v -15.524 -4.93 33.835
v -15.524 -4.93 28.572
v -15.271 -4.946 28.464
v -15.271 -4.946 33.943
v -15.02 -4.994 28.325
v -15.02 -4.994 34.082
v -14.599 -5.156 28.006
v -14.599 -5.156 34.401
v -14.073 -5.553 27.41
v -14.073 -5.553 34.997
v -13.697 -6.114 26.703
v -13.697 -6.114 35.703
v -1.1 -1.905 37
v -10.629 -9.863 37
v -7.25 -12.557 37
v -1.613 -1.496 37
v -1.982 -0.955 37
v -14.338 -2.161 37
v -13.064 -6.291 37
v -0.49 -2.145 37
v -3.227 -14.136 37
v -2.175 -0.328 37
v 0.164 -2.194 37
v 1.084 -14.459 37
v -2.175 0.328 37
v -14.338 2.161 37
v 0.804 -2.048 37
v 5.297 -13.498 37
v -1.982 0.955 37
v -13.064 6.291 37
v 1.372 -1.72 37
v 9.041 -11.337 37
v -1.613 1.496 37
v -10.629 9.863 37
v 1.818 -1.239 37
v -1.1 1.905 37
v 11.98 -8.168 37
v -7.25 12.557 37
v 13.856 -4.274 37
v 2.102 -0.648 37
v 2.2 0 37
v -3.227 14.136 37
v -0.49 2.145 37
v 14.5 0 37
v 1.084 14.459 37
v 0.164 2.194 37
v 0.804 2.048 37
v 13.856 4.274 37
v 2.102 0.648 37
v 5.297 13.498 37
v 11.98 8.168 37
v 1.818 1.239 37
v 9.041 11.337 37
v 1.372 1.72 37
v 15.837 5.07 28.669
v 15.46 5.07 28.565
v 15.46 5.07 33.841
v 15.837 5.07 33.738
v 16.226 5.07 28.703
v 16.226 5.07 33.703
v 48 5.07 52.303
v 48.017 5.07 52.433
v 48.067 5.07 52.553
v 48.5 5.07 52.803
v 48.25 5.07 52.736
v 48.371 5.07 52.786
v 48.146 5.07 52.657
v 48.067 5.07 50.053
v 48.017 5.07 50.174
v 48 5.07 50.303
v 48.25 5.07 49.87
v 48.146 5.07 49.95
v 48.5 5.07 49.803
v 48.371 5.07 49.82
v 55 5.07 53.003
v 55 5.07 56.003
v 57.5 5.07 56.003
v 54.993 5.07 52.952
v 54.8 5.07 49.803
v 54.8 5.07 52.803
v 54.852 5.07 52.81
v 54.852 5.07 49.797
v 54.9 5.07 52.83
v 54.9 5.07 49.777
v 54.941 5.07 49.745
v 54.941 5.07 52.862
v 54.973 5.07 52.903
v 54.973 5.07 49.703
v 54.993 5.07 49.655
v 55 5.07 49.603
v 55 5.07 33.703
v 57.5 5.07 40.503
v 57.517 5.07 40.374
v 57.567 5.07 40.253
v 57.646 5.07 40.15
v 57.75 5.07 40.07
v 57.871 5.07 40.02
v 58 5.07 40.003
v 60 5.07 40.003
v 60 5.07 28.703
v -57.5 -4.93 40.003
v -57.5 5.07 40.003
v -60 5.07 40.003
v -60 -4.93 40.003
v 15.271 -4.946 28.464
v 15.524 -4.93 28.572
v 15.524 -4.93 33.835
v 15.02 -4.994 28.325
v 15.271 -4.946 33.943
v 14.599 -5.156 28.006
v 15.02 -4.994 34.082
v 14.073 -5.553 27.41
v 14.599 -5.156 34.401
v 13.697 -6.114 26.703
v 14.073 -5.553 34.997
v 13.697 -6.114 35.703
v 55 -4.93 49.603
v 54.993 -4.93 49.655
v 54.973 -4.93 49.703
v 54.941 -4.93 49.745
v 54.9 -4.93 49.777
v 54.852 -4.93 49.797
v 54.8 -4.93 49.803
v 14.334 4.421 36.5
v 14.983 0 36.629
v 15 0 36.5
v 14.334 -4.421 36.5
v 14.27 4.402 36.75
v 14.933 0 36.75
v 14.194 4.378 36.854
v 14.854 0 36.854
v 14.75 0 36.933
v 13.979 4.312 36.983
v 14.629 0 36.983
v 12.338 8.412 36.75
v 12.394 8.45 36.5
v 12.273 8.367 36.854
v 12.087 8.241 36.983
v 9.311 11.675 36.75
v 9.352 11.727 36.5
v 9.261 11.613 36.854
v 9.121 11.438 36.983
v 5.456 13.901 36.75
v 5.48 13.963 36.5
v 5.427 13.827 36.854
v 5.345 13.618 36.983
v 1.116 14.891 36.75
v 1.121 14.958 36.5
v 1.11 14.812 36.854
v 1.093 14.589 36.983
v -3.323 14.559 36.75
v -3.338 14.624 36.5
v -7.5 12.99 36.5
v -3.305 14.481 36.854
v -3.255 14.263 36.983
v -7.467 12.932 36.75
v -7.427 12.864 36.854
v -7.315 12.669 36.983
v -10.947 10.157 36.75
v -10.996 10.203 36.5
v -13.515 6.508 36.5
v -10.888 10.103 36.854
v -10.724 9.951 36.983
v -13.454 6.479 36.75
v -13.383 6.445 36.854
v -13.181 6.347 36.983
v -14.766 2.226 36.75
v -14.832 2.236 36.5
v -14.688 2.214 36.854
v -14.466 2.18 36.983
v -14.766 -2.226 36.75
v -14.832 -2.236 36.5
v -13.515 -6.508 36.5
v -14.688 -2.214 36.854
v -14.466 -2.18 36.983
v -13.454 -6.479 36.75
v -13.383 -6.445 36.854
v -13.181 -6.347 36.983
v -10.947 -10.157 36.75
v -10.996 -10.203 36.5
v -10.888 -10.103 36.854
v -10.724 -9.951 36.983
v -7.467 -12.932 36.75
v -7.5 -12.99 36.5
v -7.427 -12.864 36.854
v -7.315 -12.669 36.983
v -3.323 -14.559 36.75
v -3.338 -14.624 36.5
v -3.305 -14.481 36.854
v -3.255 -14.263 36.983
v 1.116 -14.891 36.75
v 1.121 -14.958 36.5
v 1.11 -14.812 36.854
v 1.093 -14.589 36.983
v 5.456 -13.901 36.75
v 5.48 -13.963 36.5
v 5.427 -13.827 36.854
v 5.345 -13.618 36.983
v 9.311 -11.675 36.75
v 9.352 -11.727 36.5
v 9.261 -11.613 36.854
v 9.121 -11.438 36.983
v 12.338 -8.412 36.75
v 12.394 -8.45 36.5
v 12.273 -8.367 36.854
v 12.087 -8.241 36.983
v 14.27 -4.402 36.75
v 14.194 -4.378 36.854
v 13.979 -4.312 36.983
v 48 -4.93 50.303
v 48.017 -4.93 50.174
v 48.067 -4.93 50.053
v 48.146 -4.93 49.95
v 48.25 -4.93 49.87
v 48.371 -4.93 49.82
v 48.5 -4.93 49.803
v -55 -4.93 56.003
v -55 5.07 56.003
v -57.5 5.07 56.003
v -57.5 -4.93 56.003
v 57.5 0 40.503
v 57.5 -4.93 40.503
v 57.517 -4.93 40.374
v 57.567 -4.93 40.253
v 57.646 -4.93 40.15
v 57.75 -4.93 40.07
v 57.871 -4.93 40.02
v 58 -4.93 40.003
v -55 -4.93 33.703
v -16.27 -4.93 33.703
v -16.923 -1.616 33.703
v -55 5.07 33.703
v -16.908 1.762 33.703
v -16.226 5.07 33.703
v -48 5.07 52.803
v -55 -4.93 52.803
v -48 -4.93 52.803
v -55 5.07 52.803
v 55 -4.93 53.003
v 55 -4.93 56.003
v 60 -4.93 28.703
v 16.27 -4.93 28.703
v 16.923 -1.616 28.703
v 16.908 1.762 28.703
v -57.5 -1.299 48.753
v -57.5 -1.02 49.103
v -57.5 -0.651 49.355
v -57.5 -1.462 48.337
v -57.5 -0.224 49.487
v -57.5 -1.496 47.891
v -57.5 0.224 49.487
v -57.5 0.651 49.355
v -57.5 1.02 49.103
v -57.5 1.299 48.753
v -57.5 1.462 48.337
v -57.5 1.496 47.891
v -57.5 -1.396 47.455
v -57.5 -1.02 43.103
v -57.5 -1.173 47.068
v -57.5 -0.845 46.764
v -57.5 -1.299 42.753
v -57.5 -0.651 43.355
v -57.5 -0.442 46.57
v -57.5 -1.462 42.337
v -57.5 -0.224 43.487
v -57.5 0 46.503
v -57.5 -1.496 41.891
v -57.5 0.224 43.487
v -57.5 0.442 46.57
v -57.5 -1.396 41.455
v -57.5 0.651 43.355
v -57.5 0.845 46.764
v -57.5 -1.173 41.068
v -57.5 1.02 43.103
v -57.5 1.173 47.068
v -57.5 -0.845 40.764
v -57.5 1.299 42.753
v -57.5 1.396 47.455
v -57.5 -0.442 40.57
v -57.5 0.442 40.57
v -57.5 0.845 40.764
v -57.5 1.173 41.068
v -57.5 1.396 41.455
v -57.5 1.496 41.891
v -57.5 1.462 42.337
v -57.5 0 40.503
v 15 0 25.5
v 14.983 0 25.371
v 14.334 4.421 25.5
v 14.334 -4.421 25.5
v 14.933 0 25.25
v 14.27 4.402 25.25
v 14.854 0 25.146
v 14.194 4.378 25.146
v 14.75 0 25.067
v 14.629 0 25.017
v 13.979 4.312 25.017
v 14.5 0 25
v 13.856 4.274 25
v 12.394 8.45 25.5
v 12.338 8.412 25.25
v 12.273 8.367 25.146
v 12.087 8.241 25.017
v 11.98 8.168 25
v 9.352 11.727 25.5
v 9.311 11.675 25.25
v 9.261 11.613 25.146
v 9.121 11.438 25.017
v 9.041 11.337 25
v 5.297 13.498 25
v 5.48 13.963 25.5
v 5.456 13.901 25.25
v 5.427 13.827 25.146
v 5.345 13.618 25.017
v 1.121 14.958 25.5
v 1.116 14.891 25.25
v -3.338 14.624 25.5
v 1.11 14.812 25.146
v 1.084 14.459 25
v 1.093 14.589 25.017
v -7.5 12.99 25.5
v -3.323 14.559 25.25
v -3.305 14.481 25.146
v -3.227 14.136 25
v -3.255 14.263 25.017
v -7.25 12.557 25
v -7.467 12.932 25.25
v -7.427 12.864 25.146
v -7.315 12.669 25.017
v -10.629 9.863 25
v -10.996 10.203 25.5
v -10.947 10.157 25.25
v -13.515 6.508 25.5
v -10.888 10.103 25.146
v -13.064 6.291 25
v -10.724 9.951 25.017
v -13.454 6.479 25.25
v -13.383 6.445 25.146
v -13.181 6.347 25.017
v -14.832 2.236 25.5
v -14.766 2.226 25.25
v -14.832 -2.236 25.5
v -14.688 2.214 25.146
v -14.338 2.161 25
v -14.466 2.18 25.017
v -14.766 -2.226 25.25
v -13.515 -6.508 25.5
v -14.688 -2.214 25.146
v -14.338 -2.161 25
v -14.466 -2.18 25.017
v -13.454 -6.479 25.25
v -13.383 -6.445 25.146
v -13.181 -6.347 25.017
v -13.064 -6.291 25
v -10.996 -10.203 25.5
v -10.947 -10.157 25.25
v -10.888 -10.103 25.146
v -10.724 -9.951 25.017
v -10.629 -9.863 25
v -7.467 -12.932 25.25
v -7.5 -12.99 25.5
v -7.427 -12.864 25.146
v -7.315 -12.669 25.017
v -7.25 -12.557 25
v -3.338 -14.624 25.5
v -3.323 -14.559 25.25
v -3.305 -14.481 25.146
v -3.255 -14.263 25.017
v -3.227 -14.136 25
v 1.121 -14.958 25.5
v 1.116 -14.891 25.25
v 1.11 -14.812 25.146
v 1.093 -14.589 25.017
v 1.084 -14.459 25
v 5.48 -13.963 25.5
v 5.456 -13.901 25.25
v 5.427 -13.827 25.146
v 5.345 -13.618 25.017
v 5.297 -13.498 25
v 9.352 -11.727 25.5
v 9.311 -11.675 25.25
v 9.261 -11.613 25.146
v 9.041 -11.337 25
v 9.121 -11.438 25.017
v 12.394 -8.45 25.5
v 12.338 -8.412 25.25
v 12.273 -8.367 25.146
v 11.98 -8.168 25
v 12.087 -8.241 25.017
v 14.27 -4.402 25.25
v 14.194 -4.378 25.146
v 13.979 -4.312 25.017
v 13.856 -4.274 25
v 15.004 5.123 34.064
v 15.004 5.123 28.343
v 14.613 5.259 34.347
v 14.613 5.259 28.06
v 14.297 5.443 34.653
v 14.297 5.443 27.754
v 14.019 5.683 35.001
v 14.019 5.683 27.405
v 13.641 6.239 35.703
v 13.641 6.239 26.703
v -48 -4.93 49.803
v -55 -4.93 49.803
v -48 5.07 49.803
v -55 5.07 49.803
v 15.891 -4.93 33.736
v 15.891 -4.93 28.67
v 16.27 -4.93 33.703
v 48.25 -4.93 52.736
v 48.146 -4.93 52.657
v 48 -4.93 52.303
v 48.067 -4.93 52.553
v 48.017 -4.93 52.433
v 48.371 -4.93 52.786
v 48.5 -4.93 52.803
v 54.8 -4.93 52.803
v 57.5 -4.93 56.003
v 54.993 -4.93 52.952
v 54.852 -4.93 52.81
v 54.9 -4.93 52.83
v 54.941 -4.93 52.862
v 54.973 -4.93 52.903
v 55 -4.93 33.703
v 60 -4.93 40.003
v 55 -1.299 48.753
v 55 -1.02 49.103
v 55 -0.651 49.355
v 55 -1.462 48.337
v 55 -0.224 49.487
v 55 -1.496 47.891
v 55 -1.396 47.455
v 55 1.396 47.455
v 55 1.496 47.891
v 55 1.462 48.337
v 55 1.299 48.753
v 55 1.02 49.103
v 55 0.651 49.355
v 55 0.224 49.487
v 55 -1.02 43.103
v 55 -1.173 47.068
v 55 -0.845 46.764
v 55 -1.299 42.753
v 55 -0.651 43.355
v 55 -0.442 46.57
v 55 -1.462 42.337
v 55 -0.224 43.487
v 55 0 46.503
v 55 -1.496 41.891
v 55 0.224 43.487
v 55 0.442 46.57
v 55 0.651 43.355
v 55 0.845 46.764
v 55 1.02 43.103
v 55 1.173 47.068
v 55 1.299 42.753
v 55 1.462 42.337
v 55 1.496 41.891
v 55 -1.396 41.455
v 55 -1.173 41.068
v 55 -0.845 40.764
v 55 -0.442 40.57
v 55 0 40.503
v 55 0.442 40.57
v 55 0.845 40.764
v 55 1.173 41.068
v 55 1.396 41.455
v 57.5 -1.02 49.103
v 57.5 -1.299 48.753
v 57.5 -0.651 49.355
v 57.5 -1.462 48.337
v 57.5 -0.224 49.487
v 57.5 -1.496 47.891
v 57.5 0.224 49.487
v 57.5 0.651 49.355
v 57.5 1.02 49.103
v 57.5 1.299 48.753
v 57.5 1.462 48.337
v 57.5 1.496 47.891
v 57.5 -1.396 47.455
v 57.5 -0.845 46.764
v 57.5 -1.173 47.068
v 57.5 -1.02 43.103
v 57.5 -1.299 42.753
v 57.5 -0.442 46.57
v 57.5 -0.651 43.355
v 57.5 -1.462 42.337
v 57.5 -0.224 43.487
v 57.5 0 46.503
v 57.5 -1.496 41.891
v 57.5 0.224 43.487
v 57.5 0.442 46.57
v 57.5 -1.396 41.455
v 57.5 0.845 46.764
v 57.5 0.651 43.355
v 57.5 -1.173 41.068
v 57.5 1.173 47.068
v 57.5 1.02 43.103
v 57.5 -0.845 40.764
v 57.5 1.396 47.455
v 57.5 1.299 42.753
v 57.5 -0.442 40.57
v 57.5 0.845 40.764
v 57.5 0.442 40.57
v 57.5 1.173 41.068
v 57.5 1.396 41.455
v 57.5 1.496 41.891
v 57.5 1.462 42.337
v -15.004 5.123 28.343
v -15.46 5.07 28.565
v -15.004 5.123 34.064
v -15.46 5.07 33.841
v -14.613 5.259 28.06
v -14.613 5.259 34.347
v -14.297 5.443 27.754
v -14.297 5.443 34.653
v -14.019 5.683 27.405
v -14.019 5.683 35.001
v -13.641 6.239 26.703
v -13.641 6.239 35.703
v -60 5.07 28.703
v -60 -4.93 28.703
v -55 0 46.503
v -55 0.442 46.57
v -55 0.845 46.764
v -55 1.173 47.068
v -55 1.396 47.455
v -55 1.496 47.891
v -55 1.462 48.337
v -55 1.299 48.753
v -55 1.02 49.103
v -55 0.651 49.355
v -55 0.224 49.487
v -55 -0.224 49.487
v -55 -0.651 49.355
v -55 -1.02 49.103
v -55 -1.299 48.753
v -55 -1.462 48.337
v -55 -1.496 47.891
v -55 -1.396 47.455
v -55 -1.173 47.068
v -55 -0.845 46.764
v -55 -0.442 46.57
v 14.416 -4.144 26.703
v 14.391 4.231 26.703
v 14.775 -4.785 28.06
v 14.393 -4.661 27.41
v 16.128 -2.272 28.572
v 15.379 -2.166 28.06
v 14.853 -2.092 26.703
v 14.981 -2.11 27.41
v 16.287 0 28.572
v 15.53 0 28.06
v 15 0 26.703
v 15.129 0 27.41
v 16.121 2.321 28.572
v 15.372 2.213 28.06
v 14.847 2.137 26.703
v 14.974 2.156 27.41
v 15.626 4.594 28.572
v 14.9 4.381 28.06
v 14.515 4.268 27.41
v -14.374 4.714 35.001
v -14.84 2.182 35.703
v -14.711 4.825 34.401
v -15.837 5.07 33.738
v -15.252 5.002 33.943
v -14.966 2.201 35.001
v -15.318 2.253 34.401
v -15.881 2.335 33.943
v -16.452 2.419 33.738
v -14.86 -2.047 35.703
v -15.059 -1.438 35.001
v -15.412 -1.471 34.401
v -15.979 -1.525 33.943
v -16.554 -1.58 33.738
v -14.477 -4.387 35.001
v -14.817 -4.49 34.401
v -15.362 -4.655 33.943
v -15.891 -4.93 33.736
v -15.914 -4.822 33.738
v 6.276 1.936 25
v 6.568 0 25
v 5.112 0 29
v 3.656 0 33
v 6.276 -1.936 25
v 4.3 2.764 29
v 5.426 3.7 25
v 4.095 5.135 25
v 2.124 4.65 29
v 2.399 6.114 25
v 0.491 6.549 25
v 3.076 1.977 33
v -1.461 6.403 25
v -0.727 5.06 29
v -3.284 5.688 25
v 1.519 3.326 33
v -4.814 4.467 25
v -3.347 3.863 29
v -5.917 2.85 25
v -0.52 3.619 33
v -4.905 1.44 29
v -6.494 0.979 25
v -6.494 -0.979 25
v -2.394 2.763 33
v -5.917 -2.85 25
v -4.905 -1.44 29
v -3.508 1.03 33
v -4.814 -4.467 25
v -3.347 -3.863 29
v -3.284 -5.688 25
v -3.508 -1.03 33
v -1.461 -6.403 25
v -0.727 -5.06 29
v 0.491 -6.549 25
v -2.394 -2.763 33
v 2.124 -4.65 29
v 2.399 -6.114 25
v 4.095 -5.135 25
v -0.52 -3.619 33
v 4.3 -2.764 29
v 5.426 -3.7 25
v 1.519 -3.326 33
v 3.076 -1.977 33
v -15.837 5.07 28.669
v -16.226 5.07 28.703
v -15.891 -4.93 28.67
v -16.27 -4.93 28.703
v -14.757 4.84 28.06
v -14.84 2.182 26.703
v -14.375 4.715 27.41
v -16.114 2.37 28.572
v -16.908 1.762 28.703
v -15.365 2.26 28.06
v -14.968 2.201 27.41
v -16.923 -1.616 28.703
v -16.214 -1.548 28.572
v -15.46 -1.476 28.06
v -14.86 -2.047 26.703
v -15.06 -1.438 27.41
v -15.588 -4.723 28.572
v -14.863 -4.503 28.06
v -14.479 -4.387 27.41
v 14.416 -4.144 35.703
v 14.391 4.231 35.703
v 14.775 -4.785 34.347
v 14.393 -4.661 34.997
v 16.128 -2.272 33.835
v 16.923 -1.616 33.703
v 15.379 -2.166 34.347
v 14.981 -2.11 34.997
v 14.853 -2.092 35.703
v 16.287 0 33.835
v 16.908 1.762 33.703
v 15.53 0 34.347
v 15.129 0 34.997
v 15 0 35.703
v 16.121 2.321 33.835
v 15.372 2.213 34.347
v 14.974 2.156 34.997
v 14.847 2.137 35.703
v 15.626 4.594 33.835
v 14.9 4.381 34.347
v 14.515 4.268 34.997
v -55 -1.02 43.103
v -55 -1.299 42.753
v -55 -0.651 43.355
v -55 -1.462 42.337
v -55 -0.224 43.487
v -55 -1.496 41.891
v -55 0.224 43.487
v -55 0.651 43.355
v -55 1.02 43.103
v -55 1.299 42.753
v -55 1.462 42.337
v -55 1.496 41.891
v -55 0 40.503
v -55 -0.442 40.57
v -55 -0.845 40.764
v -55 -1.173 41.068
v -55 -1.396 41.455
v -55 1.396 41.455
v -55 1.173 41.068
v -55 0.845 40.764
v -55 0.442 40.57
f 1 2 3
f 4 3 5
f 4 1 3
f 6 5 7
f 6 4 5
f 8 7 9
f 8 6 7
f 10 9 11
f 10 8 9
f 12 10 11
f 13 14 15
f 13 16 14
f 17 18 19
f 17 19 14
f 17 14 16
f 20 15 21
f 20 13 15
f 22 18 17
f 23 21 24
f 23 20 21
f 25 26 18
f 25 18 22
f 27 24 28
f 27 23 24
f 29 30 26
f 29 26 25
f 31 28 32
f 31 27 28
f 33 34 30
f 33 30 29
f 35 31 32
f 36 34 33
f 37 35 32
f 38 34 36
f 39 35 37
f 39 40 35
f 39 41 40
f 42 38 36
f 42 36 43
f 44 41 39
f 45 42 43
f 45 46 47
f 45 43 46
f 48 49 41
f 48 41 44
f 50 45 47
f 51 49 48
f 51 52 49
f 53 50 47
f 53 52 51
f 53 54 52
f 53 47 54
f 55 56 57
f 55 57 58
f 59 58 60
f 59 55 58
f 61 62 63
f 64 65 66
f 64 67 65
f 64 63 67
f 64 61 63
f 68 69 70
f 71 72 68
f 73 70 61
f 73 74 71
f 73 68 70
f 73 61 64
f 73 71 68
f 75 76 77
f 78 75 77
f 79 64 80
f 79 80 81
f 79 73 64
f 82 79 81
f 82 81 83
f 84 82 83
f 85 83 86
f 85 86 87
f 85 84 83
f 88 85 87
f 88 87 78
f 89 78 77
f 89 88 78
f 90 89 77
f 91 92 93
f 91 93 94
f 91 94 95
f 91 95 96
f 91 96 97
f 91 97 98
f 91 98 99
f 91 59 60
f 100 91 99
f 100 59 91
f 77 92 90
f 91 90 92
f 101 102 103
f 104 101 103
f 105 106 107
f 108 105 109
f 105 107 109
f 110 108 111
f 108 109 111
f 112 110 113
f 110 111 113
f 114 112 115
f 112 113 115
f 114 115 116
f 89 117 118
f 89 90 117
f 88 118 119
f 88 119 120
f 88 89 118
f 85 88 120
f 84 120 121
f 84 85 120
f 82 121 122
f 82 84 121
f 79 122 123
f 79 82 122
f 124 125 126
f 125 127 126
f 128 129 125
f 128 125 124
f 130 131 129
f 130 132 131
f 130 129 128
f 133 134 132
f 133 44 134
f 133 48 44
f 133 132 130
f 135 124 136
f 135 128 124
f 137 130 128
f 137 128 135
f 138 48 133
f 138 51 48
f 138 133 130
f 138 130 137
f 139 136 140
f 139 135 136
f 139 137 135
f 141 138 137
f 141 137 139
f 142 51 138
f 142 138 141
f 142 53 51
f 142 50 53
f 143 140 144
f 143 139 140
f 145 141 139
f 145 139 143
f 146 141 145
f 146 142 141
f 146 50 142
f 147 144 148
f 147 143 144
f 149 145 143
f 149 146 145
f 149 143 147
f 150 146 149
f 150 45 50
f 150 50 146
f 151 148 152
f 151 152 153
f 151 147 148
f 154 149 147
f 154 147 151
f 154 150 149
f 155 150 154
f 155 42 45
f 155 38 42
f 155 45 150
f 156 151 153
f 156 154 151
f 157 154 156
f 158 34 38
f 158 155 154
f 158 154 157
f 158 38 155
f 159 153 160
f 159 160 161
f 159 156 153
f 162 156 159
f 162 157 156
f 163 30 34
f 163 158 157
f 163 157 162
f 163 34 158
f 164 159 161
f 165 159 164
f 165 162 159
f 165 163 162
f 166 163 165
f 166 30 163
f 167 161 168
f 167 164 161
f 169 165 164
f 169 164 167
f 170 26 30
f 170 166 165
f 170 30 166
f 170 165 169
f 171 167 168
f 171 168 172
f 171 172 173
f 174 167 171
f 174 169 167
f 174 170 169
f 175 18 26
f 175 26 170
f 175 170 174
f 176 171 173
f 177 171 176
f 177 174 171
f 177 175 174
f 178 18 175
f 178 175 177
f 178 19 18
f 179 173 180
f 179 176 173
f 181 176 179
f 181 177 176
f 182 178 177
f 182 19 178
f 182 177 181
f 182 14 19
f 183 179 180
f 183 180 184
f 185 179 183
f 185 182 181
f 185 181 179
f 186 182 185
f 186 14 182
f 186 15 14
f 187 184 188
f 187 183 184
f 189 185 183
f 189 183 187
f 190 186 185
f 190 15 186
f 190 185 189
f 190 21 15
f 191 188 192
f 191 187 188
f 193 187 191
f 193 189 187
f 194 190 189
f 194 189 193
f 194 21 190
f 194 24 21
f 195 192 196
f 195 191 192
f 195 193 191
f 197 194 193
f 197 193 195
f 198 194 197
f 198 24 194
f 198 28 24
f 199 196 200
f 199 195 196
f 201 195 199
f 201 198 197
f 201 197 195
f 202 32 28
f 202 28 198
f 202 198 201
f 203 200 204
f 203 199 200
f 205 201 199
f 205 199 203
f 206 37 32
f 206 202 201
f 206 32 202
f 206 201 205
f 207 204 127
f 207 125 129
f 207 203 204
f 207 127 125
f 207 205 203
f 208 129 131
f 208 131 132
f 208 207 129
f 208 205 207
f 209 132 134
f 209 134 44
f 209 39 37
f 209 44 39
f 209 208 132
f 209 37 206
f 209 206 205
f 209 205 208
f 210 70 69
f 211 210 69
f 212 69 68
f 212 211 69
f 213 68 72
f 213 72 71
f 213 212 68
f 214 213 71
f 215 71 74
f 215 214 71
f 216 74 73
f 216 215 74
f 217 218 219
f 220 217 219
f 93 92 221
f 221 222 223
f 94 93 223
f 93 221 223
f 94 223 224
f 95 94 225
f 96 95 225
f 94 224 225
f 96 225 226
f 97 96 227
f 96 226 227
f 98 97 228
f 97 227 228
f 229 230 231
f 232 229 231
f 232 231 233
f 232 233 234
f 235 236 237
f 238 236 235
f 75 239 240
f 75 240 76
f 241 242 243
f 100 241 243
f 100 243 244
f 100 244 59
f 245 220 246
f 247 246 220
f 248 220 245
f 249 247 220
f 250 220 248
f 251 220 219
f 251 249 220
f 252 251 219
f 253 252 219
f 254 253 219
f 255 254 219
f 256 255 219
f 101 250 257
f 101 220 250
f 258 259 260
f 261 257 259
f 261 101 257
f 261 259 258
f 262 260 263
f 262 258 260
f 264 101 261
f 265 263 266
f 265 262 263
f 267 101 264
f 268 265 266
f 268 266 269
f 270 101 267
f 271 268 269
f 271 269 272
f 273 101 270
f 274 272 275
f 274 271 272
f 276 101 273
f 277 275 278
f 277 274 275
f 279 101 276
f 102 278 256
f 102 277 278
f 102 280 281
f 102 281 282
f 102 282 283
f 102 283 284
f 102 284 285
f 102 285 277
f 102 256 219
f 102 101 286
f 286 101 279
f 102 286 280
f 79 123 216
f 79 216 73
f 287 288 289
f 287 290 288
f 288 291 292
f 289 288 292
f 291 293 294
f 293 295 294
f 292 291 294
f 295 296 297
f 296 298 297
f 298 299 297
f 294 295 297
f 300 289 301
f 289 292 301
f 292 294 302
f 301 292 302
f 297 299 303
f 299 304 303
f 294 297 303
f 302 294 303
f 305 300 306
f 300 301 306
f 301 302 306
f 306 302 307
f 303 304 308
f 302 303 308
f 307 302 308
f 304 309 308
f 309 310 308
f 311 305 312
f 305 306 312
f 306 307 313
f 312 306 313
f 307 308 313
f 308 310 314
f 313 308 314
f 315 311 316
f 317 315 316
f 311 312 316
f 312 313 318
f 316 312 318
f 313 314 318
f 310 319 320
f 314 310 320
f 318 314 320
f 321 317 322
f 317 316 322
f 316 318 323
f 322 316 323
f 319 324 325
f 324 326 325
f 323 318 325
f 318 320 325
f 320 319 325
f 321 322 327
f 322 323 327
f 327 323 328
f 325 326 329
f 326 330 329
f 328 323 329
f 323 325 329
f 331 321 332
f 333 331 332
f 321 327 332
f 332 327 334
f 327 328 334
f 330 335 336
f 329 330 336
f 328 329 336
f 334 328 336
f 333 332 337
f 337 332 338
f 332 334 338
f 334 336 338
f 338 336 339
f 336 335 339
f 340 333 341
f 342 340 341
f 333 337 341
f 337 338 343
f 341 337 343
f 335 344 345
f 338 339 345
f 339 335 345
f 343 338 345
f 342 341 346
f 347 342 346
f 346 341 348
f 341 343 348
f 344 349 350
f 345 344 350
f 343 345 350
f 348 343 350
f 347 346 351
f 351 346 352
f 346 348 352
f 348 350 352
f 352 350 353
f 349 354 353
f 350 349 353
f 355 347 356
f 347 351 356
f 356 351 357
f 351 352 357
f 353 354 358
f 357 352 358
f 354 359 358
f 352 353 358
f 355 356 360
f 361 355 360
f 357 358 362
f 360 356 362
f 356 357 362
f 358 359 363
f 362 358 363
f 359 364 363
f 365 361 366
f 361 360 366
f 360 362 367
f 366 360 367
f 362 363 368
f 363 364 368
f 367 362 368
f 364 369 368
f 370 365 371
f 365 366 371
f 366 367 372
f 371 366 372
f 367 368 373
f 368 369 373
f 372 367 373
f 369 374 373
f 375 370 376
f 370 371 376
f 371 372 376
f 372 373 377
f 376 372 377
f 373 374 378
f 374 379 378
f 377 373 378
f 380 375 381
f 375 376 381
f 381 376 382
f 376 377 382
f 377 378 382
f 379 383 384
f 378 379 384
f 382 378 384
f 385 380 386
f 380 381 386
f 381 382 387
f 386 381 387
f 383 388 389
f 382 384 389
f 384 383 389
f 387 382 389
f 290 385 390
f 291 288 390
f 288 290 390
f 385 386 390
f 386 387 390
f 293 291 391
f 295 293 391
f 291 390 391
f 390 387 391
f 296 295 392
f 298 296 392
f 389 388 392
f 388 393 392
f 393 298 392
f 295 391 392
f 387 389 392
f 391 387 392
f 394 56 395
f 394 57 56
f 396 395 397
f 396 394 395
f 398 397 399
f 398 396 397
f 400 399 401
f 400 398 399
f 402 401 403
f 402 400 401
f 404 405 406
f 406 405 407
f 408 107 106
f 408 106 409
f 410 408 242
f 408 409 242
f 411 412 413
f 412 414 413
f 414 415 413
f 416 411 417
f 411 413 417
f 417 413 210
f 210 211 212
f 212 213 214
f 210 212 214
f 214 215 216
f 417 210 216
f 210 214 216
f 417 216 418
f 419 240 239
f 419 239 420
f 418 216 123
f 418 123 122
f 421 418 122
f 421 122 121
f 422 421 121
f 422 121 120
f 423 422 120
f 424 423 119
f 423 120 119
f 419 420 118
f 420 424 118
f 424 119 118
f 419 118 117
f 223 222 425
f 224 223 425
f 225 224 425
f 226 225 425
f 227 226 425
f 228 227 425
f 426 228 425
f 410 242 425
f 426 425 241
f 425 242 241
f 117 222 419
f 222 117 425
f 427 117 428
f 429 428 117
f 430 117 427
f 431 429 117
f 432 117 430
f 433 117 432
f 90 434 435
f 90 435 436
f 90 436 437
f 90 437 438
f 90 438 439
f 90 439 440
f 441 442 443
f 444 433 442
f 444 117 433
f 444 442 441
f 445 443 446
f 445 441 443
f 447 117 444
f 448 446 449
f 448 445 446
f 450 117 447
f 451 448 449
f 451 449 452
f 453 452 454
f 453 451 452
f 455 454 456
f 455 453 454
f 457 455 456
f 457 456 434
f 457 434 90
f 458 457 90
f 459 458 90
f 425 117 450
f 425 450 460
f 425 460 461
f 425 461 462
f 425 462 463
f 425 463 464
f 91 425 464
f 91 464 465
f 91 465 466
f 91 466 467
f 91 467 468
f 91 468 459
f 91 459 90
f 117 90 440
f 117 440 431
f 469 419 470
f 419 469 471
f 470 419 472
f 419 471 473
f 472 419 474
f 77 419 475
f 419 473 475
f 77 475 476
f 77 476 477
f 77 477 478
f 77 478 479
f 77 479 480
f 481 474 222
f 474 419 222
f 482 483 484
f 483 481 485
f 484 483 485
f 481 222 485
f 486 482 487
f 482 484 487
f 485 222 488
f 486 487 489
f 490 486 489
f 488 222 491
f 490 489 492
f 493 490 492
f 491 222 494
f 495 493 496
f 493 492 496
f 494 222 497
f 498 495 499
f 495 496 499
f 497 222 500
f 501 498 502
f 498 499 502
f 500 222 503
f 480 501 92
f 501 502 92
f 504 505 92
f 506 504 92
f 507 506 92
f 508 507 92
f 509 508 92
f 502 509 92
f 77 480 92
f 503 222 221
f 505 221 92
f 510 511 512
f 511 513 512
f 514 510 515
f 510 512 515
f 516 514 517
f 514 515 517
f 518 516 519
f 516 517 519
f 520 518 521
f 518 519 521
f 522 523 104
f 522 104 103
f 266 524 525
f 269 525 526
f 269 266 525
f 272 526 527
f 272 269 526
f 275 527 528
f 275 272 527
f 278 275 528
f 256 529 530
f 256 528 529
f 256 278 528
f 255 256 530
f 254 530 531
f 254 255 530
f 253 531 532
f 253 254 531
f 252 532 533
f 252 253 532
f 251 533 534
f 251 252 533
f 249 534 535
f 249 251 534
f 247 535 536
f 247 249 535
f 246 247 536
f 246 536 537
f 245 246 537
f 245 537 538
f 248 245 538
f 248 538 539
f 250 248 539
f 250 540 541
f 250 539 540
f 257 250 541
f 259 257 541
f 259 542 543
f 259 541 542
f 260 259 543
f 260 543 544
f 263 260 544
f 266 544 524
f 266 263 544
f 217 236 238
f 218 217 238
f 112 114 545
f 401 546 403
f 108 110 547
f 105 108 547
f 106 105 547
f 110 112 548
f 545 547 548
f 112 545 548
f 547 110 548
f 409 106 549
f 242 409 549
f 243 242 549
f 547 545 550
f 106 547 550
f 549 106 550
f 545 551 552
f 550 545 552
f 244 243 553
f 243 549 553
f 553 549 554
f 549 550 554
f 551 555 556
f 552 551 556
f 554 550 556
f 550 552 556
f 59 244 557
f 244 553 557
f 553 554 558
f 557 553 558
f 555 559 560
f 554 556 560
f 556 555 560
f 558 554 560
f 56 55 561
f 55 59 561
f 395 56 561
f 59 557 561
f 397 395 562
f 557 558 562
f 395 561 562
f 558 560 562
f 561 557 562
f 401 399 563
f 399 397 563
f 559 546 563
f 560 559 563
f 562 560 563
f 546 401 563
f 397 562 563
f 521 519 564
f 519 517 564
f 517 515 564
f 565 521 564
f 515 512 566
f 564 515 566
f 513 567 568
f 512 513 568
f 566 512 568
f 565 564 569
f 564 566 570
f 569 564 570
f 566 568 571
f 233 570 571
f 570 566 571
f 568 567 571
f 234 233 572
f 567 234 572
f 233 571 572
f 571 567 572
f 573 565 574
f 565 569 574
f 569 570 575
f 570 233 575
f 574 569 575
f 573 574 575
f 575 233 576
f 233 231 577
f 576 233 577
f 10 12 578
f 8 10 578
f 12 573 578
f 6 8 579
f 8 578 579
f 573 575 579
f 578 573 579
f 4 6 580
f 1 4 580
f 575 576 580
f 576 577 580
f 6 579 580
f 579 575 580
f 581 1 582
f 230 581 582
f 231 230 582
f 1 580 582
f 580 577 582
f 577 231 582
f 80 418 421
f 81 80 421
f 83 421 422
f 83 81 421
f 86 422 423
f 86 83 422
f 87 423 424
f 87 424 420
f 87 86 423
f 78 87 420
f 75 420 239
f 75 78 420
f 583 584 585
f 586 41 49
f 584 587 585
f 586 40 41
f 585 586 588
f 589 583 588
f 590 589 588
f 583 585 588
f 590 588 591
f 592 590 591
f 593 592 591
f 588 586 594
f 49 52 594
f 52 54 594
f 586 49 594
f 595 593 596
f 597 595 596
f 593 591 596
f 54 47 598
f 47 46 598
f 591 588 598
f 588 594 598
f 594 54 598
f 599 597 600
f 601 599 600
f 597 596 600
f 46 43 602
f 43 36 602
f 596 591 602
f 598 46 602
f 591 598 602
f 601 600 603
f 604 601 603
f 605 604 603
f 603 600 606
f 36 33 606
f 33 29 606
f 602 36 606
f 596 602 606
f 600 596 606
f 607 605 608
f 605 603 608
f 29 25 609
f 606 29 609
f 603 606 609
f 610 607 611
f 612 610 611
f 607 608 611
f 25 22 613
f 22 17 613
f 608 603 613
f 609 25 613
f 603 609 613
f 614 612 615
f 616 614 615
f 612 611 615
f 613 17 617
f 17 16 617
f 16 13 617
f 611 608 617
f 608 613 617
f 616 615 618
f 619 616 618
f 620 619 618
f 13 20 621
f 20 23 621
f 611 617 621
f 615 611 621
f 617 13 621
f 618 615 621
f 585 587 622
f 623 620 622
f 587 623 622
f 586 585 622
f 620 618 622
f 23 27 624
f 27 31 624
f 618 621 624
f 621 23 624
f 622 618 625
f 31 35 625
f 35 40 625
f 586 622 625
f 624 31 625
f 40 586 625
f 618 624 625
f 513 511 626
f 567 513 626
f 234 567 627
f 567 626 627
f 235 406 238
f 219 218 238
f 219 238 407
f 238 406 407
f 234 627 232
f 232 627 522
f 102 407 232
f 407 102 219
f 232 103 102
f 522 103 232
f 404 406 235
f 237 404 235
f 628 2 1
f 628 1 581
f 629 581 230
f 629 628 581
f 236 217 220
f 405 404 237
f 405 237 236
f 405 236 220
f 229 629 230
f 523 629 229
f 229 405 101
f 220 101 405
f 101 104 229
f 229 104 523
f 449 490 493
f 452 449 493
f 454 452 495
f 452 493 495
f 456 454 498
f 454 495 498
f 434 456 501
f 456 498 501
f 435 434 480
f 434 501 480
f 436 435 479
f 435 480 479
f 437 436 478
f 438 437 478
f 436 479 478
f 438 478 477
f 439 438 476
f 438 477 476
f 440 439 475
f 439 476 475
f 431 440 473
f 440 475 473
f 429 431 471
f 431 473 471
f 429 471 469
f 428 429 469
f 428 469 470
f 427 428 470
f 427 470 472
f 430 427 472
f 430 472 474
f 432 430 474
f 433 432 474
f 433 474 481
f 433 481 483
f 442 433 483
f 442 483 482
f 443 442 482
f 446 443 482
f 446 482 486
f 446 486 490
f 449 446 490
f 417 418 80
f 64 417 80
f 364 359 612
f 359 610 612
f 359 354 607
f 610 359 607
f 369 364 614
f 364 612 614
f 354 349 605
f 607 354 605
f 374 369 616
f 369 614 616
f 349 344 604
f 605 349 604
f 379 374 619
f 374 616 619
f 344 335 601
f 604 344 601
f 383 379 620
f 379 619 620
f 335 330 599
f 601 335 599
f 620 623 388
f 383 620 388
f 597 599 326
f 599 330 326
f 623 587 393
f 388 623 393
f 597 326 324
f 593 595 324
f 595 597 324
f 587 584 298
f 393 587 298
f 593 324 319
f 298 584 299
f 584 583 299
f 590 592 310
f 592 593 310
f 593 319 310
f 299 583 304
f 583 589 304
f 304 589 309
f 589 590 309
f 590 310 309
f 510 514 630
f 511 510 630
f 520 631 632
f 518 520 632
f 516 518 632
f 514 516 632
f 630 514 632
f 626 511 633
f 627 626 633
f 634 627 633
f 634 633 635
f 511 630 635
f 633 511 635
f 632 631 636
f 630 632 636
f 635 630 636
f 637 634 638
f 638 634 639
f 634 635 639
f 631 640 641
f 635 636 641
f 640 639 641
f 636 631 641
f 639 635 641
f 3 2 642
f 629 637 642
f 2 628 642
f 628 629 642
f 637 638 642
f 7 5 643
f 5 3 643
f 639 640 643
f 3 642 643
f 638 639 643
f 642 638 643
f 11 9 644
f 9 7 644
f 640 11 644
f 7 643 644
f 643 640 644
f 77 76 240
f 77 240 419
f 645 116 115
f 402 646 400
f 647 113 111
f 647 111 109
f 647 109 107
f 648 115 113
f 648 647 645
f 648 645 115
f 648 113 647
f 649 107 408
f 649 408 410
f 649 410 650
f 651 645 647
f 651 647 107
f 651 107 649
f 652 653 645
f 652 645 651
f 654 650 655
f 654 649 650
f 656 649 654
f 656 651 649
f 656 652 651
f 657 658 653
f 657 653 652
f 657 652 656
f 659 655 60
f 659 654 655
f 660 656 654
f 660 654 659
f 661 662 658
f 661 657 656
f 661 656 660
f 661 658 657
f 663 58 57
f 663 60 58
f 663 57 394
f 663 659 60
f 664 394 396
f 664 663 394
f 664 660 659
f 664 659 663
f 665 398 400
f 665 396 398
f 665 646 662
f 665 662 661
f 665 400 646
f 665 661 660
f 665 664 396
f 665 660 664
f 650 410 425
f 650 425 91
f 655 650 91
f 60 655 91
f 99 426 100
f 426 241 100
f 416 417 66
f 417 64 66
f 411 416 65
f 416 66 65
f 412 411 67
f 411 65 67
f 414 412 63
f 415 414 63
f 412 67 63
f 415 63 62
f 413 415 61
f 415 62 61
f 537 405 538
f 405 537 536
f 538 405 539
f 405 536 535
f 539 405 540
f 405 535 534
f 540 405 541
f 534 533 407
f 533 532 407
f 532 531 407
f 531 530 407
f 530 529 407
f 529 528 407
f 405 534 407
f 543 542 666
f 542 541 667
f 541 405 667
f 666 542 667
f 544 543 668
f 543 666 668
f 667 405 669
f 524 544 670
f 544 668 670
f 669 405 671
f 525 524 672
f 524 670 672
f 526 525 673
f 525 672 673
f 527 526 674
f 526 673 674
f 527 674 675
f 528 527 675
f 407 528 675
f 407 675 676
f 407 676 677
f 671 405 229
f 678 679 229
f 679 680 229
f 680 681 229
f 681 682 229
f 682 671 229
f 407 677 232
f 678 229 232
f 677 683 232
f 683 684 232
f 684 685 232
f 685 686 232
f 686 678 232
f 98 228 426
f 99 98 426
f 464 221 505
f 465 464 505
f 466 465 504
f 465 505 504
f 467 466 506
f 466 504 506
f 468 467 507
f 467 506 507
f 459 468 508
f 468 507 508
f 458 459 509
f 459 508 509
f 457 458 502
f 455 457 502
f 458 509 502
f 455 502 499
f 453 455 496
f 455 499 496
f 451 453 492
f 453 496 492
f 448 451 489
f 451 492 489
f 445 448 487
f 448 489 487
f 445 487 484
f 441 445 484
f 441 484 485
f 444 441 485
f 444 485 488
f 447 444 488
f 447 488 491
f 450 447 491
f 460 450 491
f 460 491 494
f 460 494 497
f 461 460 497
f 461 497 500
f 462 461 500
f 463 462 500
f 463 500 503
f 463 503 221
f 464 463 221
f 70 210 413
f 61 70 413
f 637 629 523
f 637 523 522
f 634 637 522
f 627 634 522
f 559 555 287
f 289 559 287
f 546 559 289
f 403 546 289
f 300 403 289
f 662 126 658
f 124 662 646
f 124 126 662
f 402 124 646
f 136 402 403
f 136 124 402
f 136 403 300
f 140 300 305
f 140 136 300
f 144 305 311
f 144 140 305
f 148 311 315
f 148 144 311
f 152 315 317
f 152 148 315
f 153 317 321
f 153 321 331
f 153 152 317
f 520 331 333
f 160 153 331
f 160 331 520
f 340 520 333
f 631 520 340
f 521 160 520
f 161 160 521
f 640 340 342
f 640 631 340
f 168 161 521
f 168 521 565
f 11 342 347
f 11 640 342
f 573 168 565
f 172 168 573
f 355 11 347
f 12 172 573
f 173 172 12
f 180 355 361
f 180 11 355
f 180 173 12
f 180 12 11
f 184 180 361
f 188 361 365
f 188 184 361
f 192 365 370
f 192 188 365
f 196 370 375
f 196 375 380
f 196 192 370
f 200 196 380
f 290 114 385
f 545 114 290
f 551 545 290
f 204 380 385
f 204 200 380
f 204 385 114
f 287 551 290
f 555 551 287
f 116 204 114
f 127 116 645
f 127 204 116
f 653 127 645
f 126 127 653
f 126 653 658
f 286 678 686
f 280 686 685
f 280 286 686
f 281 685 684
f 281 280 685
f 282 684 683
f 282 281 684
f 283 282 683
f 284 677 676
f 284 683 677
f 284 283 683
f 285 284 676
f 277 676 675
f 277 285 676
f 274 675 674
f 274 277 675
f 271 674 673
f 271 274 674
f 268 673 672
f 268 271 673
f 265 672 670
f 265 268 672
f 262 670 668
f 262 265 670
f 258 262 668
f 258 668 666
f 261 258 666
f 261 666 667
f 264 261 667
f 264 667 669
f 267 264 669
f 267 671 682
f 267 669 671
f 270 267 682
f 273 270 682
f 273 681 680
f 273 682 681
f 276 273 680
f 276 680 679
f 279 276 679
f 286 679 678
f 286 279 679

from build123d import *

# Parameters (mm, degrees)
SKETCH7_R            = 15
BOSS_EXTRUDE2_DEPTH  = 12
SKETCH8_R            = 2.2
CUT_EXTRUDE2_DEPTH   = 20
CUT_EXTRUDE2_DRAFT   = 20
BOSS_EXTRUDE4_START  = -3
SKETCH11_W           = 5
SKETCH11_H           = 10
BOSS_EXTRUDE4_DEPTH  = 48
SKETCH14_W           = 5
SKETCH14_H           = 10
BOSS_EXTRUDE5_DEPTH  = 6.3
SKETCH17_W           = 2.5
SKETCH17_H           = 10
BOSS_EXTRUDE8_DEPTH  = 16
SKETCH20_R           = 1.5
CUT_EXTRUDE3_DEPTH   = 15
FILLET2_R            = 2
FILLET7_R            = 0.5
FILLET8_R            = 0.5
SKETCH24_W           = 3
SKETCH24_H           = 10
BOSS_EXTRUDE11_DEPTH = 7
FILLET2_OF_MIRROR5_R = 2
FILLET9_R            = 0.2
FILLET10_START       = -6
FILLET10_DEPTH       = 12
FILLET10_START_2     = -4.929582237
FILLET10_2_DEPTH     = 10
FILLET11_R           = 0.5


with BuildPart() as part:
    # Sketch7 → Boss-Extrude2 (new body)
    with BuildSketch(Plane.XY.offset(37)):
        Circle(SKETCH7_R)
    extrude(amount=-BOSS_EXTRUDE2_DEPTH)


with BuildPart() as cut_extrude2_tool:
    # Sketch8 → Cut-Extrude2 (with draft: the straight prism first)
    with BuildSketch(Plane.XY.offset(37)):
        Circle(SKETCH8_R)
    extrude(amount=-CUT_EXTRUDE2_DEPTH)
    # Cut-Extrude2: the draft: its side faces are tilted about the plane it starts from
    cut_extrude2_sides = [cut_extrude2_tool.faces().sort_by_distance(p)[0] for p in [
        (-2.2, 0, 27),
    ]]
    draft(cut_extrude2_sides, Plane.XY.offset(37), CUT_EXTRUDE2_DRAFT)


with BuildPart() as part_1:
    add(part.part)

    # Cut-Extrude2: cut by cut_extrude2_tool
    add(cut_extrude2_tool.part, mode=Mode.SUBTRACT)

    # Sketch11 → Boss-Extrude4 (add)
    with BuildSketch(Plane(origin=(15, 0, 0), x_dir=(0, 0, -1), z_dir=(1, 0, 0)).offset(BOSS_EXTRUDE4_START)):
        with Locations((-31.203319291, 0.070417763)):
            Rectangle(SKETCH11_W, SKETCH11_H)
    boss_extrude4 = extrude(amount=BOSS_EXTRUDE4_DEPTH)

    # Sketch14 → Boss-Extrude5 (add)
    with BuildSketch(Plane.XY.offset(33.703319291)):
        with Locations((57.5, 0.070417763)):
            Rectangle(SKETCH14_W, SKETCH14_H)
    boss_extrude5 = extrude(amount=BOSS_EXTRUDE5_DEPTH)

    # Sketch17 → Boss-Extrude8 (add)
    with BuildSketch(Plane.XY.offset(40.003319291)):
        with Locations((56.25, 0.070417763)):
            Rectangle(SKETCH17_W, SKETCH17_H)
    boss_extrude8 = extrude(amount=BOSS_EXTRUDE8_DEPTH)

    # Sketch20 → Cut-Extrude3 (cut)
    with BuildSketch(Plane(origin=(57.5, 0, 0), x_dir=(0, 0, -1), z_dir=(1, 0, 0))):
        with Locations((-42.003319291, 0)):
            Circle(SKETCH20_R)
        with Locations((-48.003319291, 0)):
            Circle(SKETCH20_R)
    cut_extrude3 = extrude(amount=-CUT_EXTRUDE3_DEPTH, mode=Mode.SUBTRACT)

    # Fillet2
    fillet2_edges = [part_1.edges().sort_by_distance(p)[0] for p in [
        (14.166835178, -4.929582237, 31.203319291),
        (14.777611852, 2.573361217, 28.703319291),
        (14.117041606, 5.070417763, 31.203319291),
        (14.777611852, 2.573361217, 33.703319291),
    ]]
    fillet(fillet2_edges, radius=FILLET2_R)

    # Fillet7
    fillet7_edges = [part_1.edges().sort_by_distance(p)[0] for p in [
        (-15, 0, 37),
    ]]
    fillet(fillet7_edges, radius=FILLET7_R)

    # Fillet8
    fillet8_edges = [part_1.edges().sort_by_distance(p)[0] for p in [
        (-15, 0, 25),
    ]]
    fillet(fillet8_edges, radius=FILLET8_R)

    # Sketch24 → Boss-Extrude11 (add)
    with BuildSketch(Plane.ZY.offset(-55)):
        with Locations((51.303319291, 0.070417763)):
            Rectangle(SKETCH24_W, SKETCH24_H)
    boss_extrude11 = extrude(amount=BOSS_EXTRUDE11_DEPTH)

    # Mirror5: Boss-Extrude4, Boss-Extrude5, Boss-Extrude8, Cut-Extrude3, Boss-Extrude11 across plane
    add(boss_extrude4.mirror(Plane(origin=(0, 0, 0), x_dir=(0, 0, 1), z_dir=(1, 0, 0))))
    add(boss_extrude5.mirror(Plane(origin=(0, 0, 0), x_dir=(0, 0, 1), z_dir=(1, 0, 0))))
    add(boss_extrude8.mirror(Plane(origin=(0, 0, 0), x_dir=(0, 0, 1), z_dir=(1, 0, 0))))
    add(cut_extrude3.mirror(Plane(origin=(0, 0, 0), x_dir=(0, 0, 1), z_dir=(1, 0, 0))), mode=Mode.SUBTRACT)
    add(boss_extrude11.mirror(Plane(origin=(0, 0, 0), x_dir=(0, 0, 1), z_dir=(1, 0, 0))))

    # Fillet2 of Mirror5
    fillet2_of_mirror5_edges = [part_1.edges().sort_by_distance(p)[0] for p in [
        (-14.166835178, -4.929582237, 31.203319291),
        (-14.777611852, 2.573361217, 28.703319291),
        (-14.117041606, 5.070417763, 31.203319291),
        (-14.777611852, 2.573361217, 33.703319291),
    ]]
    fillet(fillet2_of_mirror5_edges, radius=FILLET2_OF_MIRROR5_R)

    # Fillet9
    fillet9_edges = [part_1.edges().sort_by_distance(p)[0] for p in [
        (55, 0.070417763, 52.803319291),
        (55, 0.070417763, 49.803319291),
    ]]
    fillet(fillet9_edges, radius=FILLET9_R)

    # Fillet10: read off the stored shape, not the designer's step
    # Fillet10 outline → Fillet10 (cut)
    with BuildSketch(Plane(origin=(0, 0, 0), x_dir=(1, 0, 0), z_dir=(0, 1, 0)).offset(FILLET10_START)):
        with BuildLine():
            Line((48, -49.803319291), (48, -50.303319291))
            ThreePointArc((48, -50.303319291), (48.14644661, -49.949765901), (48.5, -49.803319291))
            Line((48.5, -49.803319291), (48, -49.803319291))
        make_face()
    extrude(amount=FILLET10_DEPTH, mode=Mode.SUBTRACT)

    # Fillet10 2 outline → Fillet10 2 (add)
    with BuildSketch(Plane(origin=(0, 0, 0), x_dir=(1, 0, 0), z_dir=(0, 1, 0)).offset(FILLET10_START_2)):
        with BuildLine():
            ThreePointArc((57.5, -40.503319291), (57.64644661, -40.149765901), (58, -40.003319291))
            Line((58, -40.003319291), (57.5, -40.003319291))
            Line((57.5, -40.003319291), (57.5, -40.503319291))
        make_face()
    extrude(amount=FILLET10_2_DEPTH)

    # Fillet11
    fillet11_edges = [part_1.edges().sort_by_distance(p)[0] for p in [
        (48, 0.070417763, 52.803319291),
    ]]
    fillet(fillet11_edges, radius=FILLET11_R)


solid = part_1.part
